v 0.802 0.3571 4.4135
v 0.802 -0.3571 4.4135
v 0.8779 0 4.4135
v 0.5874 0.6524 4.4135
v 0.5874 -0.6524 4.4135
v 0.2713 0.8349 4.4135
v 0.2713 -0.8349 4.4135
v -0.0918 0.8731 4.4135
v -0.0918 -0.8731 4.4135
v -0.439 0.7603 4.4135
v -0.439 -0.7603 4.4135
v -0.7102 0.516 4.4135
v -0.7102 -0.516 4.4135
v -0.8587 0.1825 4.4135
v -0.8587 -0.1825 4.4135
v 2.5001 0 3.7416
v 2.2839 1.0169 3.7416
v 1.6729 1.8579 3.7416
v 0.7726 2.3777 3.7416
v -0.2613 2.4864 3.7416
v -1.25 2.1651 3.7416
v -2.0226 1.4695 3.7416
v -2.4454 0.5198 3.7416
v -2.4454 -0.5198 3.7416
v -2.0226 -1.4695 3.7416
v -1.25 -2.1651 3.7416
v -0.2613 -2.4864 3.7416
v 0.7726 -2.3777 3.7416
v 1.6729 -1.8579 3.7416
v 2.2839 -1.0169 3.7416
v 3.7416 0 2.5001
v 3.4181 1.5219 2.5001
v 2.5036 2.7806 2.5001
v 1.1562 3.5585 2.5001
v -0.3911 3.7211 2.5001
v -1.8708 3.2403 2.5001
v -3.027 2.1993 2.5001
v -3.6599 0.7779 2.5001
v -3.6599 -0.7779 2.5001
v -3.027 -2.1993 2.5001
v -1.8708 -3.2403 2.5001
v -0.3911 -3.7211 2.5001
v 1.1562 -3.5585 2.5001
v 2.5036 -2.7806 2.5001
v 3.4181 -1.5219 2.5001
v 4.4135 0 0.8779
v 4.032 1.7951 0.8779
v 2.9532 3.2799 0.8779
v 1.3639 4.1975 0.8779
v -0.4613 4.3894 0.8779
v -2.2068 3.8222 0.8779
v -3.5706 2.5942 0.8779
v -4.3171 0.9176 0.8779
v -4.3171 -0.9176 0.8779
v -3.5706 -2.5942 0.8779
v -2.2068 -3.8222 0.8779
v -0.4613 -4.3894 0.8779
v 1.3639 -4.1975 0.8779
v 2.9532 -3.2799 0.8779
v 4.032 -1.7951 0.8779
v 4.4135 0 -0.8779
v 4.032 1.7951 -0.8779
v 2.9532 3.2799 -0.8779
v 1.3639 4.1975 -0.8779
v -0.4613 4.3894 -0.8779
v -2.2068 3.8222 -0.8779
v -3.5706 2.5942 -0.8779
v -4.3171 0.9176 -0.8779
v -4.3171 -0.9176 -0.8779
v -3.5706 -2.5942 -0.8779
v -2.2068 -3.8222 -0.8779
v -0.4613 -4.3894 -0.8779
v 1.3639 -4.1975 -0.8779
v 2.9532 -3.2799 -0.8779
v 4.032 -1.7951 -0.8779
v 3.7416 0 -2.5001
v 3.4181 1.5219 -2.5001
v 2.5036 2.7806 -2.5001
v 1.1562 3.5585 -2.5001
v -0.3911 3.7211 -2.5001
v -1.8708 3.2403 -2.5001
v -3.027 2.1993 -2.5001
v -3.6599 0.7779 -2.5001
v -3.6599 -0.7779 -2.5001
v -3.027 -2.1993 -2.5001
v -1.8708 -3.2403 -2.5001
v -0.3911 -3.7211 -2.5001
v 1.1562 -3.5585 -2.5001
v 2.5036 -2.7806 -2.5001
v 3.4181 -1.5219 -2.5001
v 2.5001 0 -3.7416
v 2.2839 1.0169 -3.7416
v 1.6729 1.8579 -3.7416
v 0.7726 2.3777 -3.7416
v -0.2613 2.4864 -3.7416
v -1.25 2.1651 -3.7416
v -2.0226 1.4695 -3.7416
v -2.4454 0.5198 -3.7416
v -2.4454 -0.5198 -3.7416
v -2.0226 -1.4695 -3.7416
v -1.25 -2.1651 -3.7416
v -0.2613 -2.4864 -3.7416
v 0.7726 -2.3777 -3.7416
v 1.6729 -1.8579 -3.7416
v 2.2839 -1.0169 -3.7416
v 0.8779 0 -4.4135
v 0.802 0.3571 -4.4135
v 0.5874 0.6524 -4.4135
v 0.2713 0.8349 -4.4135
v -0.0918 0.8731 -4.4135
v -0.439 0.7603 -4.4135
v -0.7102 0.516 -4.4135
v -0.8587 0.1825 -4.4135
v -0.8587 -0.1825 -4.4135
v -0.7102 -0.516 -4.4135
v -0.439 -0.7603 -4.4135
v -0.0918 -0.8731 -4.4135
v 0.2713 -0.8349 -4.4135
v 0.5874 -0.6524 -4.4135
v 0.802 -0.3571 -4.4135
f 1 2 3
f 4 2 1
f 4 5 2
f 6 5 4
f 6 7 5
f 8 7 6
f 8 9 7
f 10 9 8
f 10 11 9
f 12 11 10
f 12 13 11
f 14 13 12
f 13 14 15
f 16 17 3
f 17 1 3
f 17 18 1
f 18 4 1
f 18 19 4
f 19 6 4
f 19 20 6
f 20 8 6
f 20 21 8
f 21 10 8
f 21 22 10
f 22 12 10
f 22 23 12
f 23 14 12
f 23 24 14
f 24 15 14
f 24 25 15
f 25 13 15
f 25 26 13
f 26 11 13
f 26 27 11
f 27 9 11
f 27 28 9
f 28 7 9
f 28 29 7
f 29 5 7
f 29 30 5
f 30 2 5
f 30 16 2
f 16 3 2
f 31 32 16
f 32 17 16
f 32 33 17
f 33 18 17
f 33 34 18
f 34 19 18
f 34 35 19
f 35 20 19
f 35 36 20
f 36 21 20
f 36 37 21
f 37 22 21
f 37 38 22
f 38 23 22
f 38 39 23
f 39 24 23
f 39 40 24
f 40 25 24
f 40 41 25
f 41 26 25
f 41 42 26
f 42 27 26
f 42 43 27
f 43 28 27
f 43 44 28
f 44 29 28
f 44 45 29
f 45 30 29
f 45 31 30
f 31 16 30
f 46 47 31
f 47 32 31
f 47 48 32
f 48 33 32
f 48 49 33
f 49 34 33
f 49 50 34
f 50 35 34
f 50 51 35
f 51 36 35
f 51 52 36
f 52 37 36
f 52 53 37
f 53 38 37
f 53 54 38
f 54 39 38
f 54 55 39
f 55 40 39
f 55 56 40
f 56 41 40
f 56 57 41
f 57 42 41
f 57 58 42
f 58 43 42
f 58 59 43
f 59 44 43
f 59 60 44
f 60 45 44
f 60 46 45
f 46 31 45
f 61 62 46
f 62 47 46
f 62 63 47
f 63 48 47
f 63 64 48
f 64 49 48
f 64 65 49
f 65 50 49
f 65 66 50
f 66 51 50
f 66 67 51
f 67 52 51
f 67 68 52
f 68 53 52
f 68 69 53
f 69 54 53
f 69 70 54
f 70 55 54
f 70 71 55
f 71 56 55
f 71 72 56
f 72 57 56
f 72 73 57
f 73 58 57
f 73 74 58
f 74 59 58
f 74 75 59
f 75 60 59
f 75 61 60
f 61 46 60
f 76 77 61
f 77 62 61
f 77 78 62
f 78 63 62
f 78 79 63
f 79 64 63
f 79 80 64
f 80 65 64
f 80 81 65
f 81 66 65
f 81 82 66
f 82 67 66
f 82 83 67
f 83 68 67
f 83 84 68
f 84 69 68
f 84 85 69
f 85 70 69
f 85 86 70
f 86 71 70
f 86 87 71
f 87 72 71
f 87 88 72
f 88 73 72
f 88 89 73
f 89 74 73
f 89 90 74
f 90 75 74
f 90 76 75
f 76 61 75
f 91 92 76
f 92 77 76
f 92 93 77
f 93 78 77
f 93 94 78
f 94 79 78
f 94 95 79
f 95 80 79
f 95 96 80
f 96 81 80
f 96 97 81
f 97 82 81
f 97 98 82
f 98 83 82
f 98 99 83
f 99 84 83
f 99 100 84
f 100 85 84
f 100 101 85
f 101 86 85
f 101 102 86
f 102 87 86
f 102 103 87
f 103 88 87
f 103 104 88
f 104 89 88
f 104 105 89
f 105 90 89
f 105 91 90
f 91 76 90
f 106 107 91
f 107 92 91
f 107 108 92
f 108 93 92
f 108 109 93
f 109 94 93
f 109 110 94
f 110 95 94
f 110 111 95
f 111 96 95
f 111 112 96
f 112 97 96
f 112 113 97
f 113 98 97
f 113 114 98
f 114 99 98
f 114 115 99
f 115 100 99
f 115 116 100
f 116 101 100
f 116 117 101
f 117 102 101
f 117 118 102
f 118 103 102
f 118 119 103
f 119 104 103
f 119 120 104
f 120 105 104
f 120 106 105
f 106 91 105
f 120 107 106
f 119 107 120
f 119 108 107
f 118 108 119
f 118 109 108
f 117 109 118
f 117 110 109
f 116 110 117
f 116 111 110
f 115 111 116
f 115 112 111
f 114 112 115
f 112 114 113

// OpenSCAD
// Generated by SolidPython 1.0.1 on 2020-07-29 00:02:42


sphere(d = 9, r = 5);
/***********************************************
*********      SolidPython code:      **********
************************************************
 
# import packages: SolidPython
from solid import *
from solid.utils import *
from itertools import chain, combinations


class Resize:

    def __init__(self, scad_file):
        self.scad_file = scad_file
        #self.scad_file = import_scad(scad_file)
        # cone/cylinder param:
        self.r1 = 0
        self.r2 = 0
        self.h = 0
        # rectangular prism param:
        self.w = 0
        self.l = 0
        # ellipse param:
        self.r = 0

    # import OpenScad code (file name corresponds to shape)


    # classify shape + parameters
    def assign(self, param1, param2, param3):
        if self.scad_file == 'cone.scad':
            self.r1 = param1
            self.r2 = param2
            self.h = param3
        elif self.scad_file == 'cylinder.scad':
            self.r1 = param1
            self.r2 = param2
            self.h = param3
        elif self.scad_file == 'rectangularPrism.scad':
            self.h = param1
            self.l = param2
            self.w = param3
        else:
            self.r = param1
            self.h = param2

    # resize parameters
    def iterate(self):
        x = range(3, 20, 2)
        i = 1
        if self.scad_file == 'cone.scad':
            tempList = list(combinations(x, 3))
            #print(tempList)
            for i in x:
                for j in range (3):
                    param1 = tempList[i][0]
                    param2 = tempList[i][1]
                    param3 = tempList[i][2]
                    filepath = 'produced_scad_files/' + 'cone' + str(param1) + '_' + str(param2) + '_' + str(param3) + '.scad'
                    scad_render_to_file(cylinder(h=param1, r1=param2, r2=param3), filepath)

        elif self.scad_file == 'cylinder.scad':
            tempList = list(combinations(x, 3))
            for i in x:
                for j in range(3):
                    param1 = tempList[i][0]
                    param2 = tempList[i][1]
                    param3 = tempList[i][2]
                    filepath = 'produced_scad_files/' + 'cylinder' + str(param1) + '_' + str(param2) + '_' + str(param3) + '.scad'
                    scad_render_to_file(cylinder(h=param1, r1=param2, r2=param3), filepath)

        elif self.scad_file == 'rectangularPrism.scad':
            tempList = list(combinations(x, 3))
            for i in x:
                for j in range(3):
                    param1 = tempList[i][0]
                    param2 = tempList[i][1]
                    param3 = tempList[i][2]
                    filepath = 'produced_scad_files/' + 'rectangularPrism' + str(param1) + '_' + str(param2) + '_' + str(
                        param3) + '.scad'
                    scad_render_to_file(cube(size=(param1, param2, param3)), filepath)

        else:
            tempList = list(combinations(x, 2))
            for i in x:
                for j in range(3):
                    param1 = tempList[i][0]
                    param2 = tempList[i][1]
                    filepath = 'produced_scad_files/' + 'ellipse' + str(param1) + '_' + str(param2) + '_' + '.scad'
                    scad_render_to_file(sphere(param1, param2), filepath)

    def render_to_scadfile(self):
        scad_render_to_file(scad, 'example.scad') 
 
************************************************/
